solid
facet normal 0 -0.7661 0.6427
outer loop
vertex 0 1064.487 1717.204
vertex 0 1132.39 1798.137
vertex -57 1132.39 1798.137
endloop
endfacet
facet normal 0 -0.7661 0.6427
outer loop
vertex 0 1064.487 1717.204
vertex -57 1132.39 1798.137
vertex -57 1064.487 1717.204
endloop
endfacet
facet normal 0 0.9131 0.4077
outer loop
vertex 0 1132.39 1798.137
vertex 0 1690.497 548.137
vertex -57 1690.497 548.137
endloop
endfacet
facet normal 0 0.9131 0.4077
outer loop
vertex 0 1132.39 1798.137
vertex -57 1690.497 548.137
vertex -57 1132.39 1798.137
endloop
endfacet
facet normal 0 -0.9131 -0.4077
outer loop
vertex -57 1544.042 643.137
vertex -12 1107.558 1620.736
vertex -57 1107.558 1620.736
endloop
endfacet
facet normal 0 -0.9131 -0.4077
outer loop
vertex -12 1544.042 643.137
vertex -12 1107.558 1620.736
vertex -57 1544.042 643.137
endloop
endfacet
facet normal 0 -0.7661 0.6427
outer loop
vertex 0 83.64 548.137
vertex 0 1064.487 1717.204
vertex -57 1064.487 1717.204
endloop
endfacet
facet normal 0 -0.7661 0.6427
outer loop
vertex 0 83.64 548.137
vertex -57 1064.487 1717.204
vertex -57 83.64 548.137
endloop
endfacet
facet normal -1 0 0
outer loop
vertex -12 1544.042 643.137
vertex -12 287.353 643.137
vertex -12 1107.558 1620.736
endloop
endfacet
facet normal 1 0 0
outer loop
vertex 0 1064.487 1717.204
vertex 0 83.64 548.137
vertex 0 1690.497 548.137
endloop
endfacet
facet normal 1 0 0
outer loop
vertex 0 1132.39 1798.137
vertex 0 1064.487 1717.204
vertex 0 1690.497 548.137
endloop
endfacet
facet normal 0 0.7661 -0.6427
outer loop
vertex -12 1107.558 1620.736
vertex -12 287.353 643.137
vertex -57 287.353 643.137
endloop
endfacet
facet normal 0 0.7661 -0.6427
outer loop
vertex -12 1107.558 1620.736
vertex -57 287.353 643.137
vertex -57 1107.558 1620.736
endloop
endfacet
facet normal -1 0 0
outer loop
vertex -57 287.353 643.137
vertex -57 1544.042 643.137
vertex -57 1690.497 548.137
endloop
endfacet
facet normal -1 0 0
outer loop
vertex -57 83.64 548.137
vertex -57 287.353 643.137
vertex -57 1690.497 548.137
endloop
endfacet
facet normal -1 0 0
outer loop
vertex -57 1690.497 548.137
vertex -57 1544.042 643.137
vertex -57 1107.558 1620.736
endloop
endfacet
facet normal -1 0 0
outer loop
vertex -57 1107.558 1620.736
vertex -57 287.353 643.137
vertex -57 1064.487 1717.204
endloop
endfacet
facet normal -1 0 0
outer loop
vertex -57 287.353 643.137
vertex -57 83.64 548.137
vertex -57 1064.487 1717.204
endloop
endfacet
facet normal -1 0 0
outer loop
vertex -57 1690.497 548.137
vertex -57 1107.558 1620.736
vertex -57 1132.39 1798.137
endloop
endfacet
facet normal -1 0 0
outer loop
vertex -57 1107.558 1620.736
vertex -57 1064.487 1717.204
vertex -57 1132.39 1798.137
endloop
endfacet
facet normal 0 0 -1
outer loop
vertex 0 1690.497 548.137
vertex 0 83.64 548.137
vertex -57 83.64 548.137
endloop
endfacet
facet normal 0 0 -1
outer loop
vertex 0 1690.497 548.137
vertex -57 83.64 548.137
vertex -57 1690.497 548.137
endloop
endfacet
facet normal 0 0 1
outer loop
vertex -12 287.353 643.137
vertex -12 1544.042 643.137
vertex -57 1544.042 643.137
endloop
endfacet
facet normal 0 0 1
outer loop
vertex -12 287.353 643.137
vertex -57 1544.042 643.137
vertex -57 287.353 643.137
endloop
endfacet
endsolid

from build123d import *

# Parameters (mm, degrees)
F1_DEPTH = 57
F2_DEPTH = 12


with BuildPart() as f1:
    # F0 (on Right) → F1 (new body)
    with BuildSketch(Plane.YZ):
        Polygon((1107.558378, 1620.736191), (1544.042206, 643.137381), (1586.458342, 548.137381), (1690.497414, 548.137381), (1132.390367, 1798.137381), (1064.487016, 1717.203709), align=None)
        Polygon((207.647976, 548.137381), (287.352976, 643.137381), (1107.558378, 1620.736191), (1064.487016, 1717.203709), (83.640367, 548.137381), align=None)
        Polygon((1586.458342, 548.137381), (1544.042206, 643.137381), (287.352976, 643.137381), (207.647976, 548.137381), align=None)
    extrude(amount=-F1_DEPTH)

    # F0 (on Right) → F2 (join)
    with BuildSketch(Plane.YZ):
        Polygon((287.352976, 643.137381), (1544.042206, 643.137381), (1107.558378, 1620.736191), align=None)
    extrude(amount=-F2_DEPTH)


solid = f1.part
